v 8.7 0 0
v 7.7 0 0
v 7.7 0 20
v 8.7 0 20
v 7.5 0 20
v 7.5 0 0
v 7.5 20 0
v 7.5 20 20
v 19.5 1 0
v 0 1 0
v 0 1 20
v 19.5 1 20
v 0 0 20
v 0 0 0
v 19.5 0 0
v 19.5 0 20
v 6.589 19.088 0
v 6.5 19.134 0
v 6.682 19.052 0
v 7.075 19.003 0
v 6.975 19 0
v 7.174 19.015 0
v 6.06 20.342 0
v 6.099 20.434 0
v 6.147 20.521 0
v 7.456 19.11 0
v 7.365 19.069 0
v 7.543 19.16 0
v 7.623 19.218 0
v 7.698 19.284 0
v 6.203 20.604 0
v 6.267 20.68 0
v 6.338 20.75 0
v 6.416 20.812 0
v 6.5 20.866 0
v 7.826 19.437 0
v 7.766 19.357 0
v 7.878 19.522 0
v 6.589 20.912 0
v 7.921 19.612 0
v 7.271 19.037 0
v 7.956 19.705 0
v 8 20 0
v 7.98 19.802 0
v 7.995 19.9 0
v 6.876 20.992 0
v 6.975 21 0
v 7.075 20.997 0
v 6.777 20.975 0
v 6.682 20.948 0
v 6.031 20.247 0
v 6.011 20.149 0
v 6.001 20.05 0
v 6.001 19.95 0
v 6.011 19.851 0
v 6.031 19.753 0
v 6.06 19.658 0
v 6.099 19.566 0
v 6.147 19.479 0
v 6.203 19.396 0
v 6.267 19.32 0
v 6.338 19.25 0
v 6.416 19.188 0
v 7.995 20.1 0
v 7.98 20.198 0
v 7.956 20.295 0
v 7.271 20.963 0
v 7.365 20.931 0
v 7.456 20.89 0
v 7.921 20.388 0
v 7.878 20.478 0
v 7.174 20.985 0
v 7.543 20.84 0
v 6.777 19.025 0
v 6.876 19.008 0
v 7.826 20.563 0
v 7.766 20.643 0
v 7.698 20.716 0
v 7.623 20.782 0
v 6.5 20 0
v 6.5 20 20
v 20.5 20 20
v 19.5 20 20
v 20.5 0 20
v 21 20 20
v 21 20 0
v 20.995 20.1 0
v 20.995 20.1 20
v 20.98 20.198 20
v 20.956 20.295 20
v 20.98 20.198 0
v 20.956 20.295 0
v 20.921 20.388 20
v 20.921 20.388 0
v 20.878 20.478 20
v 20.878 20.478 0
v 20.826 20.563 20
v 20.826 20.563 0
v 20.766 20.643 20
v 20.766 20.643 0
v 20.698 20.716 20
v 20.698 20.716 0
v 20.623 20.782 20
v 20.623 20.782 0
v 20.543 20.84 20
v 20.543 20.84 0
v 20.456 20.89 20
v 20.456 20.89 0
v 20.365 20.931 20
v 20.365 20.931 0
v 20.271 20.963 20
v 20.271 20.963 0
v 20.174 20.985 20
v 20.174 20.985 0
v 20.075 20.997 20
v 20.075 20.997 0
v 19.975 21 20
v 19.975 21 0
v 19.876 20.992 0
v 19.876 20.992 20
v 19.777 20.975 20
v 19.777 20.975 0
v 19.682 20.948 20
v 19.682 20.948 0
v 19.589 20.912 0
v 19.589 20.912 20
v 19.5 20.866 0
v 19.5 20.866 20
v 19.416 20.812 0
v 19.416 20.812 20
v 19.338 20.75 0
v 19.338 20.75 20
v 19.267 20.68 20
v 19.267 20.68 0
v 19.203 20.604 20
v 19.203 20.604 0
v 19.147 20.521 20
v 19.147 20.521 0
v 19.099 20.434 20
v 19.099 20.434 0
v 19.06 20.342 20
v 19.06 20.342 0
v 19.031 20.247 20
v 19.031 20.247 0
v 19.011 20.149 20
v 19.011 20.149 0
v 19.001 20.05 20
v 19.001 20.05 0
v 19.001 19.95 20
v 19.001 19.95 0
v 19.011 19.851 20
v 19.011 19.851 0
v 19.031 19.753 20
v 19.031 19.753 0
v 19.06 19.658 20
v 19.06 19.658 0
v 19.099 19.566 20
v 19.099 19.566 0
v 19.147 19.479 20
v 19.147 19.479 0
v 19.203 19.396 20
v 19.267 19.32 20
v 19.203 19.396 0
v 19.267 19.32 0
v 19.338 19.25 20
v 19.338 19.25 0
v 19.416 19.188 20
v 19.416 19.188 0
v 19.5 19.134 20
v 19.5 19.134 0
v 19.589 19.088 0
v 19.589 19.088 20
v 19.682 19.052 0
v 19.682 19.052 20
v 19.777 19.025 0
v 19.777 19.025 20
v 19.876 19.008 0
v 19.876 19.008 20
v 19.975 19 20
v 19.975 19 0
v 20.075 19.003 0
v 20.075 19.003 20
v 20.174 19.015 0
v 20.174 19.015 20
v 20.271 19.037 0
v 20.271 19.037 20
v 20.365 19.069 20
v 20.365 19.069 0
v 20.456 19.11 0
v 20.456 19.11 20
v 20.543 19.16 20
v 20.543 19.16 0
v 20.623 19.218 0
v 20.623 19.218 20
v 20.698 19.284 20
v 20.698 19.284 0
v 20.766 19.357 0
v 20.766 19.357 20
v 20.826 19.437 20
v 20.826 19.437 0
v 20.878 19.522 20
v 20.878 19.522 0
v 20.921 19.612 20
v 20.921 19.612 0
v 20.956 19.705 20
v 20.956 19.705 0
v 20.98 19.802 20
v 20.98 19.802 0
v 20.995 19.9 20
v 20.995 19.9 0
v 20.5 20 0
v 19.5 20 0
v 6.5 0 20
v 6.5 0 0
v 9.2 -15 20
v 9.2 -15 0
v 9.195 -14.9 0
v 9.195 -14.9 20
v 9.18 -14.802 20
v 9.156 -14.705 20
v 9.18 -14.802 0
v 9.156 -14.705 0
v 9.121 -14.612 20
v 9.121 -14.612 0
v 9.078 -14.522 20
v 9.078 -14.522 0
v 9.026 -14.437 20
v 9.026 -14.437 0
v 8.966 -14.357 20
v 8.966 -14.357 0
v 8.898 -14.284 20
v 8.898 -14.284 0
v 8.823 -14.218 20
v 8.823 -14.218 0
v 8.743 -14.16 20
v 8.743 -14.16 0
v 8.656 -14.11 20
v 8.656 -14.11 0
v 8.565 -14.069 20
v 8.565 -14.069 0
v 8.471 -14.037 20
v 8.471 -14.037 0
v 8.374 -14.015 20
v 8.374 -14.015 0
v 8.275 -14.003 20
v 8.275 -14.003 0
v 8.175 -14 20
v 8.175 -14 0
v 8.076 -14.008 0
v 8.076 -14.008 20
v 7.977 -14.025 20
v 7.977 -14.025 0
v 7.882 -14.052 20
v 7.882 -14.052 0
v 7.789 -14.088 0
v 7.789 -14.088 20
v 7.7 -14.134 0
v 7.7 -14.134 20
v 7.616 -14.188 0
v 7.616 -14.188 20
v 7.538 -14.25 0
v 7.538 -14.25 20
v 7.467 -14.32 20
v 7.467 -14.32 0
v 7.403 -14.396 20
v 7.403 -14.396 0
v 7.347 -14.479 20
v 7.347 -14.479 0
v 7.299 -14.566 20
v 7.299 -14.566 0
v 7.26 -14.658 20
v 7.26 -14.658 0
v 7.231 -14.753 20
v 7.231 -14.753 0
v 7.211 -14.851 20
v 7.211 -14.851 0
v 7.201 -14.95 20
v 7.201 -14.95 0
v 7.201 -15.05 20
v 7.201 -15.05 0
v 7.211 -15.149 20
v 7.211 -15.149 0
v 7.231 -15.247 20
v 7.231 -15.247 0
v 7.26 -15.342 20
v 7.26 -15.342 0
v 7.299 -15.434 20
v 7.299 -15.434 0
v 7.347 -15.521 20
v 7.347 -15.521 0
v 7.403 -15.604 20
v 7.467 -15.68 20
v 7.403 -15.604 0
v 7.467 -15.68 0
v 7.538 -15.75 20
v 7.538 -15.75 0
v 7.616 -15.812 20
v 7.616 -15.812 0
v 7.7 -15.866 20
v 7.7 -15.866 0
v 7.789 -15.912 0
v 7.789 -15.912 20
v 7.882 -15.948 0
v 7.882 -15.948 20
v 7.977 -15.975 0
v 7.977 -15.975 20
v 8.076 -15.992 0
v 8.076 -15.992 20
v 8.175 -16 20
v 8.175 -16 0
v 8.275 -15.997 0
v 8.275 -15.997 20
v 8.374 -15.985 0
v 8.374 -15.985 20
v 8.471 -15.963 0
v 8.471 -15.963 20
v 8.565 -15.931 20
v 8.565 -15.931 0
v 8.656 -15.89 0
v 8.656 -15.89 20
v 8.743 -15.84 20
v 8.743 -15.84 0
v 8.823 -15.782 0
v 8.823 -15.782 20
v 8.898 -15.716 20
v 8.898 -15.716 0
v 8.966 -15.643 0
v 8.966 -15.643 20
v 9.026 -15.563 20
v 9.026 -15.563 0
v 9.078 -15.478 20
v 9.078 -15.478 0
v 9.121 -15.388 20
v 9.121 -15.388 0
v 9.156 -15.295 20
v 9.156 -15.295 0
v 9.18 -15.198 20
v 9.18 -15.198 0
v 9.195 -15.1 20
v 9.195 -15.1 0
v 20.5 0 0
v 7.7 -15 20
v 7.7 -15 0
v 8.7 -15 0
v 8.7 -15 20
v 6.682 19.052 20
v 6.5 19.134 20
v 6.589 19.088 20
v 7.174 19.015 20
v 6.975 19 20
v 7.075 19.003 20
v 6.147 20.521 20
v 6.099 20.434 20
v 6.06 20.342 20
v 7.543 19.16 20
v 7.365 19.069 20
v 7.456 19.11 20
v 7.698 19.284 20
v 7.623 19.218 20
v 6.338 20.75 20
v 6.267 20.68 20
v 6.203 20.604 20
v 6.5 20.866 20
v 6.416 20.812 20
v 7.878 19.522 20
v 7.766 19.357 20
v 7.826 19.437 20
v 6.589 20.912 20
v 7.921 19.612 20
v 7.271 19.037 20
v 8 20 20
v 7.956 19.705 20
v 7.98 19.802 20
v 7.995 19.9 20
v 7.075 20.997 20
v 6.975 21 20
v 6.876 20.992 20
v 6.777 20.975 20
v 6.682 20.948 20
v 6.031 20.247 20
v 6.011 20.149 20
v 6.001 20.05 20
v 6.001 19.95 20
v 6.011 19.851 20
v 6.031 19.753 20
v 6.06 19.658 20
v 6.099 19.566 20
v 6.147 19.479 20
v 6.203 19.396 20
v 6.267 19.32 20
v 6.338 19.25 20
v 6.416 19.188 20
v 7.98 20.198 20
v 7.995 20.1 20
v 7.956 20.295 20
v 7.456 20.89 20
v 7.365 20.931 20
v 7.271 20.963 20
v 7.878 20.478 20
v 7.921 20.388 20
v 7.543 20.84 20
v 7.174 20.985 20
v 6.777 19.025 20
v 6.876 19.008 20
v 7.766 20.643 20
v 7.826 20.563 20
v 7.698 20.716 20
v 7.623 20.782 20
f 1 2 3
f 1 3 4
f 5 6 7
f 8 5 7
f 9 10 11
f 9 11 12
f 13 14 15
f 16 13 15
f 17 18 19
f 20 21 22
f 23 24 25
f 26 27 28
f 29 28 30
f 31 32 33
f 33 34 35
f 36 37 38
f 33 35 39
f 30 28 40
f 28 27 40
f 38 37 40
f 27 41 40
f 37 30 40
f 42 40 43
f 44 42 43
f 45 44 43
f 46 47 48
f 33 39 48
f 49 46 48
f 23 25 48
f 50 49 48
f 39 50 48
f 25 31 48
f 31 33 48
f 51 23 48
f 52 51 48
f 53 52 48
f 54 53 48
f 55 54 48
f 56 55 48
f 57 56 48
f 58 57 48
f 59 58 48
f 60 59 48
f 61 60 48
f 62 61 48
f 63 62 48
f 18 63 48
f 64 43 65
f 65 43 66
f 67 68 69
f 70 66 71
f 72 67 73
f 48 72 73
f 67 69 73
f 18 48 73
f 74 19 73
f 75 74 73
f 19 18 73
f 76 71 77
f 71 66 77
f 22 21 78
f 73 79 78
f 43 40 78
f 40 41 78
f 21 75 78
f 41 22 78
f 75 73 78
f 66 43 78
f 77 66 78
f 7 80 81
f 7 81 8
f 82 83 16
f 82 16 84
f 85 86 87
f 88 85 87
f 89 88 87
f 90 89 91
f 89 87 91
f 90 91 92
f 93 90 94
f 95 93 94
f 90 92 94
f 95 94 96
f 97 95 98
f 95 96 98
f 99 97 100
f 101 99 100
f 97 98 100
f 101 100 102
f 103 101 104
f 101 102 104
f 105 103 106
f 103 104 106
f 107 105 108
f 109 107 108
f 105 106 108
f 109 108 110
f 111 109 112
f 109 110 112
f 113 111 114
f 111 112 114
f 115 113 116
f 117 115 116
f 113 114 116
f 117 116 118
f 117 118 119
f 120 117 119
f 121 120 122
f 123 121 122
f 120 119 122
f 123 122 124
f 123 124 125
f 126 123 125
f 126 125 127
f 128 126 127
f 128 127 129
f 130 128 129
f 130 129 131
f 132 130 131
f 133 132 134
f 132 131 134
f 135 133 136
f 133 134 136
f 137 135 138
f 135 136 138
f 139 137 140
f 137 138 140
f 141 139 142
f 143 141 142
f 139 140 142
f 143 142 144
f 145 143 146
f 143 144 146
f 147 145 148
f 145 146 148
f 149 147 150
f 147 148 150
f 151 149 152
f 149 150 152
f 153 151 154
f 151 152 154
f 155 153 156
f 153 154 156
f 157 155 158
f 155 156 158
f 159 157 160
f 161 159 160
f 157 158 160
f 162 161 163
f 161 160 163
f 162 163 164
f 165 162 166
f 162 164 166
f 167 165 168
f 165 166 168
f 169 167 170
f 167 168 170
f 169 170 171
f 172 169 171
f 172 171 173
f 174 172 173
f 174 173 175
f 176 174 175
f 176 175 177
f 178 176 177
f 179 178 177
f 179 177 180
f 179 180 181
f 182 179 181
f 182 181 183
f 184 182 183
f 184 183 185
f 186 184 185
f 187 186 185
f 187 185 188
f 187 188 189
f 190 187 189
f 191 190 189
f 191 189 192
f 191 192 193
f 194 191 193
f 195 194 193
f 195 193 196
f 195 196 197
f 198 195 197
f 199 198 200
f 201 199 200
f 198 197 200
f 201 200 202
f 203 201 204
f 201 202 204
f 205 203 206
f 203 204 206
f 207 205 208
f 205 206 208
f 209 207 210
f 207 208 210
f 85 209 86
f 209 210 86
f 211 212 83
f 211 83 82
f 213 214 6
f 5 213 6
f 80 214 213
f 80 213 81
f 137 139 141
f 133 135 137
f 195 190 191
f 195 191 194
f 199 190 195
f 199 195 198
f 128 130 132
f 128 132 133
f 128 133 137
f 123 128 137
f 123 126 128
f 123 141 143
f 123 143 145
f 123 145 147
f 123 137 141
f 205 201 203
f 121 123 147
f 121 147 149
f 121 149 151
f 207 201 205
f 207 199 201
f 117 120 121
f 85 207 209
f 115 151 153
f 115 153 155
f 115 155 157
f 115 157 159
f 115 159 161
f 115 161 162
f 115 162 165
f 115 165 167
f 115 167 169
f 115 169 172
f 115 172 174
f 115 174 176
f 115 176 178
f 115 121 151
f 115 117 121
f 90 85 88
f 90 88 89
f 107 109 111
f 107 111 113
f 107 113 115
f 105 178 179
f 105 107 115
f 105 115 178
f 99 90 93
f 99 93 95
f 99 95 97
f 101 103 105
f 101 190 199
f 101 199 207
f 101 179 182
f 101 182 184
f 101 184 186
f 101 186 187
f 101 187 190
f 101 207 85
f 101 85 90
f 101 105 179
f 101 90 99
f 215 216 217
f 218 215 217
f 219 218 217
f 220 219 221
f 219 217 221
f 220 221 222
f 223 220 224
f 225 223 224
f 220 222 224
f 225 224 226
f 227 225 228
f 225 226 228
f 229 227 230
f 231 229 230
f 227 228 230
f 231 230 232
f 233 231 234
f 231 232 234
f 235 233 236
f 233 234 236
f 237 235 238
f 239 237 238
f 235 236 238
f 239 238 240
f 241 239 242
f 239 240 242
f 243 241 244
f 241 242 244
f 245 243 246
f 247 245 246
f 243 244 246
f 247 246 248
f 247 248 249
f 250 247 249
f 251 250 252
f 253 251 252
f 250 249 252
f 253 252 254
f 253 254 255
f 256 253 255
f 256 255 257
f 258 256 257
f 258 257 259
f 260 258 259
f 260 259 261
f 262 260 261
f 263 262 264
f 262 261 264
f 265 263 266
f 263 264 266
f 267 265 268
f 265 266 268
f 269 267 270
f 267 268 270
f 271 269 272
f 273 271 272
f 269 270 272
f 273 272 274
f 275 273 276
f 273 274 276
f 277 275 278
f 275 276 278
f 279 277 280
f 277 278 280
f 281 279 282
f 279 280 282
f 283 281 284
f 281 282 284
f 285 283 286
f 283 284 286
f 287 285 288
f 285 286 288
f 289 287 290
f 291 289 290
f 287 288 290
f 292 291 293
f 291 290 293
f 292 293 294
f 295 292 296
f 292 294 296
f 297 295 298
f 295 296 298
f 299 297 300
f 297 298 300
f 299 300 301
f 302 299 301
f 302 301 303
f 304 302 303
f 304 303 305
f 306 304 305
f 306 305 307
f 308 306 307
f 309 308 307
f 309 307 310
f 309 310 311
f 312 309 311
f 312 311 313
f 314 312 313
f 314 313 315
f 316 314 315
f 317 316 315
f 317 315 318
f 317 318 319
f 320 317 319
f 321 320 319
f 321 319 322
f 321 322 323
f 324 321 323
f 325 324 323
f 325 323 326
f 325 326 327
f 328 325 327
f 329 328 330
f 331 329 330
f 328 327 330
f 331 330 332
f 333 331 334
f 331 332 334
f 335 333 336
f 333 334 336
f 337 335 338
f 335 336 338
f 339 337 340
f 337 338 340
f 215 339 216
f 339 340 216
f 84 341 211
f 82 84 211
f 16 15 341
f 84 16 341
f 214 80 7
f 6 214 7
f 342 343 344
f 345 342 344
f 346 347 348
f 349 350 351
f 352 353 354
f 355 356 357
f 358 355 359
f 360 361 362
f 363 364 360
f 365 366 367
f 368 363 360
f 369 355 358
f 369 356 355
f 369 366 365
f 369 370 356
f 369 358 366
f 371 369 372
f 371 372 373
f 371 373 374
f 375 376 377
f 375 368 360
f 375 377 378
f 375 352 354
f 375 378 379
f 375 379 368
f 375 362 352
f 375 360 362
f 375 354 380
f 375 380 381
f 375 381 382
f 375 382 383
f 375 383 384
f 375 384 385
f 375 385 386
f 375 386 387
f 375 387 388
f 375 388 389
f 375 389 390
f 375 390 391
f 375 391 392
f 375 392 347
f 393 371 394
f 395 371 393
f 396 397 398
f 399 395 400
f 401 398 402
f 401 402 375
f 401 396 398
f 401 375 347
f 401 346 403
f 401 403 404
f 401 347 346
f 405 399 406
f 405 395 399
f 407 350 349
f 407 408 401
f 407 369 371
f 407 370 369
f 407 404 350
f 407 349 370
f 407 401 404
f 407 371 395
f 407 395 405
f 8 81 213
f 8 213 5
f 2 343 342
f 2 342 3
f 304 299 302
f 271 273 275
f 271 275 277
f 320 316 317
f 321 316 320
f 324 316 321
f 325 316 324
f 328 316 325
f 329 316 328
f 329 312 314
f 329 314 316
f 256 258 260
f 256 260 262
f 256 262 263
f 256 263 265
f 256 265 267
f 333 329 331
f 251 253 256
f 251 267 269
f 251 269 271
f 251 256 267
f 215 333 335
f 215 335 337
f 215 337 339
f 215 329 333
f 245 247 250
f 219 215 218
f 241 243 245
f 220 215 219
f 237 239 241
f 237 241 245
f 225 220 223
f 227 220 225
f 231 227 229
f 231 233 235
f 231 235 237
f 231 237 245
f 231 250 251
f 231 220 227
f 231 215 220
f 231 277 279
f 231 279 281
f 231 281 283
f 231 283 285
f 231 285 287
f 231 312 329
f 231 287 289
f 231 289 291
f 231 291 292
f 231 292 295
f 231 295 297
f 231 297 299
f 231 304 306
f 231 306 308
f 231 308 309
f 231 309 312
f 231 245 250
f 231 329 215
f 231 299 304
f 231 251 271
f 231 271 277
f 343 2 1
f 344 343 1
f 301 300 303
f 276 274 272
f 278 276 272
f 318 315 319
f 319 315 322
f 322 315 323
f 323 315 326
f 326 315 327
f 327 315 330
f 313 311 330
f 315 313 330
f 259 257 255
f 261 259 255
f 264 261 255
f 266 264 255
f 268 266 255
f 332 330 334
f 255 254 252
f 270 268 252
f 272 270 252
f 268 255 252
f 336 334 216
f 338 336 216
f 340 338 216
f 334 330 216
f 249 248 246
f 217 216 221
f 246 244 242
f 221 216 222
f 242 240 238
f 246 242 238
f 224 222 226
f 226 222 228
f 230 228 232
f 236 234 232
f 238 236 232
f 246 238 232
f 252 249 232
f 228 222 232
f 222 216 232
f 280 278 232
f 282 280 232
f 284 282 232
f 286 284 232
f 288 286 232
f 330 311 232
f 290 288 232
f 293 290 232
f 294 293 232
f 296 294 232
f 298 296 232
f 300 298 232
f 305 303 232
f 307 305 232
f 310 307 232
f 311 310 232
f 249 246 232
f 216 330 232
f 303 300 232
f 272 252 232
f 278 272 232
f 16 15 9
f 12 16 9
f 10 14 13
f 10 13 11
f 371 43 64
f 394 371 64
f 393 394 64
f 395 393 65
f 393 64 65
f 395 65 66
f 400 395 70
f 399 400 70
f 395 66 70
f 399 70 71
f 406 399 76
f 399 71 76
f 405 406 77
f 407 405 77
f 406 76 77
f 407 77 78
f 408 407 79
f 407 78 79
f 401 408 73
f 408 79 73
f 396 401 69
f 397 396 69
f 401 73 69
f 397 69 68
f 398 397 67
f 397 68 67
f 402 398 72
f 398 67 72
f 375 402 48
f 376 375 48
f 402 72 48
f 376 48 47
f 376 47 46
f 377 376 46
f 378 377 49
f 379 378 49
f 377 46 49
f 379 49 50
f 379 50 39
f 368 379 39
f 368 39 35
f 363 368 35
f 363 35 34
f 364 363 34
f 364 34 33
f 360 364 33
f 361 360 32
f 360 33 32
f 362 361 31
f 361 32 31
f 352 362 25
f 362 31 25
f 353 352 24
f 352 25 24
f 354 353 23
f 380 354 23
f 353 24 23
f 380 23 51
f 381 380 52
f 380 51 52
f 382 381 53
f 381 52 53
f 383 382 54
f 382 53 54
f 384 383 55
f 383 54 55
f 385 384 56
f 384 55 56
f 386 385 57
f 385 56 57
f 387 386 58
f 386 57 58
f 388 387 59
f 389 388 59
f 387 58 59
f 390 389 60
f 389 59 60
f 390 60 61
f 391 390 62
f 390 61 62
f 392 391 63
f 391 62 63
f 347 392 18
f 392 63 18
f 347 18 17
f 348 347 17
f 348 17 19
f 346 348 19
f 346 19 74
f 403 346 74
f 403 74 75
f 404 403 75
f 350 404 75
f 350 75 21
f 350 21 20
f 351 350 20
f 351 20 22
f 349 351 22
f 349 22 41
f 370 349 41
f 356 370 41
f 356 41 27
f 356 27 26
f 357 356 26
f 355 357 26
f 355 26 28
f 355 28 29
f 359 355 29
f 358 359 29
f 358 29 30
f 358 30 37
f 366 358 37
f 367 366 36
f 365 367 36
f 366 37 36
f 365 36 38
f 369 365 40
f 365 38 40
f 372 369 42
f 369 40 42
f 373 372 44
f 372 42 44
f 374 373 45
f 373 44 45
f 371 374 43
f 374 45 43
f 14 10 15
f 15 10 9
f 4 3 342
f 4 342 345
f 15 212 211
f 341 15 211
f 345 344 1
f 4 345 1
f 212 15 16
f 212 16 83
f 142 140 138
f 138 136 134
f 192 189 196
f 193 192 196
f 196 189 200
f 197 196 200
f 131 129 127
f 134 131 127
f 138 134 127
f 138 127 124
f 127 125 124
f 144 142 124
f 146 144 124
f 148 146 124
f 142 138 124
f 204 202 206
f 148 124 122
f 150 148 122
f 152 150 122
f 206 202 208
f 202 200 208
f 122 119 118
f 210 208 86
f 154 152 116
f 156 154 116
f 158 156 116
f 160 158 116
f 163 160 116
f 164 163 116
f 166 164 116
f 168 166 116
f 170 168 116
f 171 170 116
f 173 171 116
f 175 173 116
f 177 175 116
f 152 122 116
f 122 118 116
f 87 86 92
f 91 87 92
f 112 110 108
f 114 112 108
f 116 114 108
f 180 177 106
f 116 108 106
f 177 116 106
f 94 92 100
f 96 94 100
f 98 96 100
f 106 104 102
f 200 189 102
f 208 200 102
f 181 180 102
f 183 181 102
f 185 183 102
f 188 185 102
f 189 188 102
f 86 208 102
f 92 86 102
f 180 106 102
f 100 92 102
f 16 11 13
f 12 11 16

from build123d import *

# Parameters (mm, degrees)
BOX_W             = 19.5
BOX_H             = 1
BOX_DEPTH         = 20
BOX001_W          = 1
BOX001_H          = 20
BOX001_DEPTH      = 20
BOX002_W          = 1
BOX002_H          = 20
BOX002_DEPTH      = 20
CYLINDER_R        = 1
CYLINDER_DEPTH    = 20
CYLINDER001_R     = 1
CYLINDER001_DEPTH = 20
BOX003_W          = 1
BOX003_H          = 15
BOX003_DEPTH      = 20
CYLINDER002_R     = 1
CYLINDER002_DEPTH = 20


with BuildPart() as cube:
    # Box → Box (new body)
    with BuildSketch(Plane.XY):
        with Locations((9.75, 0.5)):
            Rectangle(BOX_W, BOX_H)
    extrude(amount=BOX_DEPTH)


with BuildPart() as cube001:
    # Box001 → Box001 (new body)
    with BuildSketch(Plane(origin=(6.5, 0, 0), x_dir=(1, 0, 0), z_dir=(0, 0, 1))):
        with Locations((0.5, 10)):
            Rectangle(BOX001_W, BOX001_H)
    extrude(amount=BOX001_DEPTH)


with BuildPart() as cube002:
    # Box002 → Box002 (new body)
    with BuildSketch(Plane(origin=(19.5, 0, 0), x_dir=(1, 0, 0), z_dir=(0, 0, 1))):
        with Locations((0.5, 10)):
            Rectangle(BOX002_W, BOX002_H)
    extrude(amount=BOX002_DEPTH)


with BuildPart() as cylinder:
    # Cylinder → Cylinder (new body)
    with BuildSketch(Plane(origin=(7, 20, 0), x_dir=(1, 0, 0), z_dir=(0, 0, 1))):
        Circle(CYLINDER_R)
    extrude(amount=CYLINDER_DEPTH)


with BuildPart() as cylinder001:
    # Cylinder001 → Cylinder001 (new body)
    with BuildSketch(Plane(origin=(20, 20, 0), x_dir=(1, 0, 0), z_dir=(0, 0, 1))):
        Circle(CYLINDER001_R)
    extrude(amount=CYLINDER001_DEPTH)


with BuildPart() as cube003:
    # Box003 → Box003 (new body)
    with BuildSketch(Plane(origin=(7.7, -15, 0), x_dir=(1, 0, 0), z_dir=(0, 0, 1))):
        with Locations((0.5, 7.5)):
            Rectangle(BOX003_W, BOX003_H)
    extrude(amount=BOX003_DEPTH)


with BuildPart() as cylinder002:
    # Cylinder002 → Cylinder002 (new body)
    with BuildSketch(Plane(origin=(8.2, -15, 0), x_dir=(1, 0, 0), z_dir=(0, 0, 1))):
        Circle(CYLINDER002_R)
    extrude(amount=CYLINDER002_DEPTH)


solid = Compound([cube.part, cube001.part, cube002.part, cylinder.part, cylinder001.part, cube003.part, cylinder002.part])
